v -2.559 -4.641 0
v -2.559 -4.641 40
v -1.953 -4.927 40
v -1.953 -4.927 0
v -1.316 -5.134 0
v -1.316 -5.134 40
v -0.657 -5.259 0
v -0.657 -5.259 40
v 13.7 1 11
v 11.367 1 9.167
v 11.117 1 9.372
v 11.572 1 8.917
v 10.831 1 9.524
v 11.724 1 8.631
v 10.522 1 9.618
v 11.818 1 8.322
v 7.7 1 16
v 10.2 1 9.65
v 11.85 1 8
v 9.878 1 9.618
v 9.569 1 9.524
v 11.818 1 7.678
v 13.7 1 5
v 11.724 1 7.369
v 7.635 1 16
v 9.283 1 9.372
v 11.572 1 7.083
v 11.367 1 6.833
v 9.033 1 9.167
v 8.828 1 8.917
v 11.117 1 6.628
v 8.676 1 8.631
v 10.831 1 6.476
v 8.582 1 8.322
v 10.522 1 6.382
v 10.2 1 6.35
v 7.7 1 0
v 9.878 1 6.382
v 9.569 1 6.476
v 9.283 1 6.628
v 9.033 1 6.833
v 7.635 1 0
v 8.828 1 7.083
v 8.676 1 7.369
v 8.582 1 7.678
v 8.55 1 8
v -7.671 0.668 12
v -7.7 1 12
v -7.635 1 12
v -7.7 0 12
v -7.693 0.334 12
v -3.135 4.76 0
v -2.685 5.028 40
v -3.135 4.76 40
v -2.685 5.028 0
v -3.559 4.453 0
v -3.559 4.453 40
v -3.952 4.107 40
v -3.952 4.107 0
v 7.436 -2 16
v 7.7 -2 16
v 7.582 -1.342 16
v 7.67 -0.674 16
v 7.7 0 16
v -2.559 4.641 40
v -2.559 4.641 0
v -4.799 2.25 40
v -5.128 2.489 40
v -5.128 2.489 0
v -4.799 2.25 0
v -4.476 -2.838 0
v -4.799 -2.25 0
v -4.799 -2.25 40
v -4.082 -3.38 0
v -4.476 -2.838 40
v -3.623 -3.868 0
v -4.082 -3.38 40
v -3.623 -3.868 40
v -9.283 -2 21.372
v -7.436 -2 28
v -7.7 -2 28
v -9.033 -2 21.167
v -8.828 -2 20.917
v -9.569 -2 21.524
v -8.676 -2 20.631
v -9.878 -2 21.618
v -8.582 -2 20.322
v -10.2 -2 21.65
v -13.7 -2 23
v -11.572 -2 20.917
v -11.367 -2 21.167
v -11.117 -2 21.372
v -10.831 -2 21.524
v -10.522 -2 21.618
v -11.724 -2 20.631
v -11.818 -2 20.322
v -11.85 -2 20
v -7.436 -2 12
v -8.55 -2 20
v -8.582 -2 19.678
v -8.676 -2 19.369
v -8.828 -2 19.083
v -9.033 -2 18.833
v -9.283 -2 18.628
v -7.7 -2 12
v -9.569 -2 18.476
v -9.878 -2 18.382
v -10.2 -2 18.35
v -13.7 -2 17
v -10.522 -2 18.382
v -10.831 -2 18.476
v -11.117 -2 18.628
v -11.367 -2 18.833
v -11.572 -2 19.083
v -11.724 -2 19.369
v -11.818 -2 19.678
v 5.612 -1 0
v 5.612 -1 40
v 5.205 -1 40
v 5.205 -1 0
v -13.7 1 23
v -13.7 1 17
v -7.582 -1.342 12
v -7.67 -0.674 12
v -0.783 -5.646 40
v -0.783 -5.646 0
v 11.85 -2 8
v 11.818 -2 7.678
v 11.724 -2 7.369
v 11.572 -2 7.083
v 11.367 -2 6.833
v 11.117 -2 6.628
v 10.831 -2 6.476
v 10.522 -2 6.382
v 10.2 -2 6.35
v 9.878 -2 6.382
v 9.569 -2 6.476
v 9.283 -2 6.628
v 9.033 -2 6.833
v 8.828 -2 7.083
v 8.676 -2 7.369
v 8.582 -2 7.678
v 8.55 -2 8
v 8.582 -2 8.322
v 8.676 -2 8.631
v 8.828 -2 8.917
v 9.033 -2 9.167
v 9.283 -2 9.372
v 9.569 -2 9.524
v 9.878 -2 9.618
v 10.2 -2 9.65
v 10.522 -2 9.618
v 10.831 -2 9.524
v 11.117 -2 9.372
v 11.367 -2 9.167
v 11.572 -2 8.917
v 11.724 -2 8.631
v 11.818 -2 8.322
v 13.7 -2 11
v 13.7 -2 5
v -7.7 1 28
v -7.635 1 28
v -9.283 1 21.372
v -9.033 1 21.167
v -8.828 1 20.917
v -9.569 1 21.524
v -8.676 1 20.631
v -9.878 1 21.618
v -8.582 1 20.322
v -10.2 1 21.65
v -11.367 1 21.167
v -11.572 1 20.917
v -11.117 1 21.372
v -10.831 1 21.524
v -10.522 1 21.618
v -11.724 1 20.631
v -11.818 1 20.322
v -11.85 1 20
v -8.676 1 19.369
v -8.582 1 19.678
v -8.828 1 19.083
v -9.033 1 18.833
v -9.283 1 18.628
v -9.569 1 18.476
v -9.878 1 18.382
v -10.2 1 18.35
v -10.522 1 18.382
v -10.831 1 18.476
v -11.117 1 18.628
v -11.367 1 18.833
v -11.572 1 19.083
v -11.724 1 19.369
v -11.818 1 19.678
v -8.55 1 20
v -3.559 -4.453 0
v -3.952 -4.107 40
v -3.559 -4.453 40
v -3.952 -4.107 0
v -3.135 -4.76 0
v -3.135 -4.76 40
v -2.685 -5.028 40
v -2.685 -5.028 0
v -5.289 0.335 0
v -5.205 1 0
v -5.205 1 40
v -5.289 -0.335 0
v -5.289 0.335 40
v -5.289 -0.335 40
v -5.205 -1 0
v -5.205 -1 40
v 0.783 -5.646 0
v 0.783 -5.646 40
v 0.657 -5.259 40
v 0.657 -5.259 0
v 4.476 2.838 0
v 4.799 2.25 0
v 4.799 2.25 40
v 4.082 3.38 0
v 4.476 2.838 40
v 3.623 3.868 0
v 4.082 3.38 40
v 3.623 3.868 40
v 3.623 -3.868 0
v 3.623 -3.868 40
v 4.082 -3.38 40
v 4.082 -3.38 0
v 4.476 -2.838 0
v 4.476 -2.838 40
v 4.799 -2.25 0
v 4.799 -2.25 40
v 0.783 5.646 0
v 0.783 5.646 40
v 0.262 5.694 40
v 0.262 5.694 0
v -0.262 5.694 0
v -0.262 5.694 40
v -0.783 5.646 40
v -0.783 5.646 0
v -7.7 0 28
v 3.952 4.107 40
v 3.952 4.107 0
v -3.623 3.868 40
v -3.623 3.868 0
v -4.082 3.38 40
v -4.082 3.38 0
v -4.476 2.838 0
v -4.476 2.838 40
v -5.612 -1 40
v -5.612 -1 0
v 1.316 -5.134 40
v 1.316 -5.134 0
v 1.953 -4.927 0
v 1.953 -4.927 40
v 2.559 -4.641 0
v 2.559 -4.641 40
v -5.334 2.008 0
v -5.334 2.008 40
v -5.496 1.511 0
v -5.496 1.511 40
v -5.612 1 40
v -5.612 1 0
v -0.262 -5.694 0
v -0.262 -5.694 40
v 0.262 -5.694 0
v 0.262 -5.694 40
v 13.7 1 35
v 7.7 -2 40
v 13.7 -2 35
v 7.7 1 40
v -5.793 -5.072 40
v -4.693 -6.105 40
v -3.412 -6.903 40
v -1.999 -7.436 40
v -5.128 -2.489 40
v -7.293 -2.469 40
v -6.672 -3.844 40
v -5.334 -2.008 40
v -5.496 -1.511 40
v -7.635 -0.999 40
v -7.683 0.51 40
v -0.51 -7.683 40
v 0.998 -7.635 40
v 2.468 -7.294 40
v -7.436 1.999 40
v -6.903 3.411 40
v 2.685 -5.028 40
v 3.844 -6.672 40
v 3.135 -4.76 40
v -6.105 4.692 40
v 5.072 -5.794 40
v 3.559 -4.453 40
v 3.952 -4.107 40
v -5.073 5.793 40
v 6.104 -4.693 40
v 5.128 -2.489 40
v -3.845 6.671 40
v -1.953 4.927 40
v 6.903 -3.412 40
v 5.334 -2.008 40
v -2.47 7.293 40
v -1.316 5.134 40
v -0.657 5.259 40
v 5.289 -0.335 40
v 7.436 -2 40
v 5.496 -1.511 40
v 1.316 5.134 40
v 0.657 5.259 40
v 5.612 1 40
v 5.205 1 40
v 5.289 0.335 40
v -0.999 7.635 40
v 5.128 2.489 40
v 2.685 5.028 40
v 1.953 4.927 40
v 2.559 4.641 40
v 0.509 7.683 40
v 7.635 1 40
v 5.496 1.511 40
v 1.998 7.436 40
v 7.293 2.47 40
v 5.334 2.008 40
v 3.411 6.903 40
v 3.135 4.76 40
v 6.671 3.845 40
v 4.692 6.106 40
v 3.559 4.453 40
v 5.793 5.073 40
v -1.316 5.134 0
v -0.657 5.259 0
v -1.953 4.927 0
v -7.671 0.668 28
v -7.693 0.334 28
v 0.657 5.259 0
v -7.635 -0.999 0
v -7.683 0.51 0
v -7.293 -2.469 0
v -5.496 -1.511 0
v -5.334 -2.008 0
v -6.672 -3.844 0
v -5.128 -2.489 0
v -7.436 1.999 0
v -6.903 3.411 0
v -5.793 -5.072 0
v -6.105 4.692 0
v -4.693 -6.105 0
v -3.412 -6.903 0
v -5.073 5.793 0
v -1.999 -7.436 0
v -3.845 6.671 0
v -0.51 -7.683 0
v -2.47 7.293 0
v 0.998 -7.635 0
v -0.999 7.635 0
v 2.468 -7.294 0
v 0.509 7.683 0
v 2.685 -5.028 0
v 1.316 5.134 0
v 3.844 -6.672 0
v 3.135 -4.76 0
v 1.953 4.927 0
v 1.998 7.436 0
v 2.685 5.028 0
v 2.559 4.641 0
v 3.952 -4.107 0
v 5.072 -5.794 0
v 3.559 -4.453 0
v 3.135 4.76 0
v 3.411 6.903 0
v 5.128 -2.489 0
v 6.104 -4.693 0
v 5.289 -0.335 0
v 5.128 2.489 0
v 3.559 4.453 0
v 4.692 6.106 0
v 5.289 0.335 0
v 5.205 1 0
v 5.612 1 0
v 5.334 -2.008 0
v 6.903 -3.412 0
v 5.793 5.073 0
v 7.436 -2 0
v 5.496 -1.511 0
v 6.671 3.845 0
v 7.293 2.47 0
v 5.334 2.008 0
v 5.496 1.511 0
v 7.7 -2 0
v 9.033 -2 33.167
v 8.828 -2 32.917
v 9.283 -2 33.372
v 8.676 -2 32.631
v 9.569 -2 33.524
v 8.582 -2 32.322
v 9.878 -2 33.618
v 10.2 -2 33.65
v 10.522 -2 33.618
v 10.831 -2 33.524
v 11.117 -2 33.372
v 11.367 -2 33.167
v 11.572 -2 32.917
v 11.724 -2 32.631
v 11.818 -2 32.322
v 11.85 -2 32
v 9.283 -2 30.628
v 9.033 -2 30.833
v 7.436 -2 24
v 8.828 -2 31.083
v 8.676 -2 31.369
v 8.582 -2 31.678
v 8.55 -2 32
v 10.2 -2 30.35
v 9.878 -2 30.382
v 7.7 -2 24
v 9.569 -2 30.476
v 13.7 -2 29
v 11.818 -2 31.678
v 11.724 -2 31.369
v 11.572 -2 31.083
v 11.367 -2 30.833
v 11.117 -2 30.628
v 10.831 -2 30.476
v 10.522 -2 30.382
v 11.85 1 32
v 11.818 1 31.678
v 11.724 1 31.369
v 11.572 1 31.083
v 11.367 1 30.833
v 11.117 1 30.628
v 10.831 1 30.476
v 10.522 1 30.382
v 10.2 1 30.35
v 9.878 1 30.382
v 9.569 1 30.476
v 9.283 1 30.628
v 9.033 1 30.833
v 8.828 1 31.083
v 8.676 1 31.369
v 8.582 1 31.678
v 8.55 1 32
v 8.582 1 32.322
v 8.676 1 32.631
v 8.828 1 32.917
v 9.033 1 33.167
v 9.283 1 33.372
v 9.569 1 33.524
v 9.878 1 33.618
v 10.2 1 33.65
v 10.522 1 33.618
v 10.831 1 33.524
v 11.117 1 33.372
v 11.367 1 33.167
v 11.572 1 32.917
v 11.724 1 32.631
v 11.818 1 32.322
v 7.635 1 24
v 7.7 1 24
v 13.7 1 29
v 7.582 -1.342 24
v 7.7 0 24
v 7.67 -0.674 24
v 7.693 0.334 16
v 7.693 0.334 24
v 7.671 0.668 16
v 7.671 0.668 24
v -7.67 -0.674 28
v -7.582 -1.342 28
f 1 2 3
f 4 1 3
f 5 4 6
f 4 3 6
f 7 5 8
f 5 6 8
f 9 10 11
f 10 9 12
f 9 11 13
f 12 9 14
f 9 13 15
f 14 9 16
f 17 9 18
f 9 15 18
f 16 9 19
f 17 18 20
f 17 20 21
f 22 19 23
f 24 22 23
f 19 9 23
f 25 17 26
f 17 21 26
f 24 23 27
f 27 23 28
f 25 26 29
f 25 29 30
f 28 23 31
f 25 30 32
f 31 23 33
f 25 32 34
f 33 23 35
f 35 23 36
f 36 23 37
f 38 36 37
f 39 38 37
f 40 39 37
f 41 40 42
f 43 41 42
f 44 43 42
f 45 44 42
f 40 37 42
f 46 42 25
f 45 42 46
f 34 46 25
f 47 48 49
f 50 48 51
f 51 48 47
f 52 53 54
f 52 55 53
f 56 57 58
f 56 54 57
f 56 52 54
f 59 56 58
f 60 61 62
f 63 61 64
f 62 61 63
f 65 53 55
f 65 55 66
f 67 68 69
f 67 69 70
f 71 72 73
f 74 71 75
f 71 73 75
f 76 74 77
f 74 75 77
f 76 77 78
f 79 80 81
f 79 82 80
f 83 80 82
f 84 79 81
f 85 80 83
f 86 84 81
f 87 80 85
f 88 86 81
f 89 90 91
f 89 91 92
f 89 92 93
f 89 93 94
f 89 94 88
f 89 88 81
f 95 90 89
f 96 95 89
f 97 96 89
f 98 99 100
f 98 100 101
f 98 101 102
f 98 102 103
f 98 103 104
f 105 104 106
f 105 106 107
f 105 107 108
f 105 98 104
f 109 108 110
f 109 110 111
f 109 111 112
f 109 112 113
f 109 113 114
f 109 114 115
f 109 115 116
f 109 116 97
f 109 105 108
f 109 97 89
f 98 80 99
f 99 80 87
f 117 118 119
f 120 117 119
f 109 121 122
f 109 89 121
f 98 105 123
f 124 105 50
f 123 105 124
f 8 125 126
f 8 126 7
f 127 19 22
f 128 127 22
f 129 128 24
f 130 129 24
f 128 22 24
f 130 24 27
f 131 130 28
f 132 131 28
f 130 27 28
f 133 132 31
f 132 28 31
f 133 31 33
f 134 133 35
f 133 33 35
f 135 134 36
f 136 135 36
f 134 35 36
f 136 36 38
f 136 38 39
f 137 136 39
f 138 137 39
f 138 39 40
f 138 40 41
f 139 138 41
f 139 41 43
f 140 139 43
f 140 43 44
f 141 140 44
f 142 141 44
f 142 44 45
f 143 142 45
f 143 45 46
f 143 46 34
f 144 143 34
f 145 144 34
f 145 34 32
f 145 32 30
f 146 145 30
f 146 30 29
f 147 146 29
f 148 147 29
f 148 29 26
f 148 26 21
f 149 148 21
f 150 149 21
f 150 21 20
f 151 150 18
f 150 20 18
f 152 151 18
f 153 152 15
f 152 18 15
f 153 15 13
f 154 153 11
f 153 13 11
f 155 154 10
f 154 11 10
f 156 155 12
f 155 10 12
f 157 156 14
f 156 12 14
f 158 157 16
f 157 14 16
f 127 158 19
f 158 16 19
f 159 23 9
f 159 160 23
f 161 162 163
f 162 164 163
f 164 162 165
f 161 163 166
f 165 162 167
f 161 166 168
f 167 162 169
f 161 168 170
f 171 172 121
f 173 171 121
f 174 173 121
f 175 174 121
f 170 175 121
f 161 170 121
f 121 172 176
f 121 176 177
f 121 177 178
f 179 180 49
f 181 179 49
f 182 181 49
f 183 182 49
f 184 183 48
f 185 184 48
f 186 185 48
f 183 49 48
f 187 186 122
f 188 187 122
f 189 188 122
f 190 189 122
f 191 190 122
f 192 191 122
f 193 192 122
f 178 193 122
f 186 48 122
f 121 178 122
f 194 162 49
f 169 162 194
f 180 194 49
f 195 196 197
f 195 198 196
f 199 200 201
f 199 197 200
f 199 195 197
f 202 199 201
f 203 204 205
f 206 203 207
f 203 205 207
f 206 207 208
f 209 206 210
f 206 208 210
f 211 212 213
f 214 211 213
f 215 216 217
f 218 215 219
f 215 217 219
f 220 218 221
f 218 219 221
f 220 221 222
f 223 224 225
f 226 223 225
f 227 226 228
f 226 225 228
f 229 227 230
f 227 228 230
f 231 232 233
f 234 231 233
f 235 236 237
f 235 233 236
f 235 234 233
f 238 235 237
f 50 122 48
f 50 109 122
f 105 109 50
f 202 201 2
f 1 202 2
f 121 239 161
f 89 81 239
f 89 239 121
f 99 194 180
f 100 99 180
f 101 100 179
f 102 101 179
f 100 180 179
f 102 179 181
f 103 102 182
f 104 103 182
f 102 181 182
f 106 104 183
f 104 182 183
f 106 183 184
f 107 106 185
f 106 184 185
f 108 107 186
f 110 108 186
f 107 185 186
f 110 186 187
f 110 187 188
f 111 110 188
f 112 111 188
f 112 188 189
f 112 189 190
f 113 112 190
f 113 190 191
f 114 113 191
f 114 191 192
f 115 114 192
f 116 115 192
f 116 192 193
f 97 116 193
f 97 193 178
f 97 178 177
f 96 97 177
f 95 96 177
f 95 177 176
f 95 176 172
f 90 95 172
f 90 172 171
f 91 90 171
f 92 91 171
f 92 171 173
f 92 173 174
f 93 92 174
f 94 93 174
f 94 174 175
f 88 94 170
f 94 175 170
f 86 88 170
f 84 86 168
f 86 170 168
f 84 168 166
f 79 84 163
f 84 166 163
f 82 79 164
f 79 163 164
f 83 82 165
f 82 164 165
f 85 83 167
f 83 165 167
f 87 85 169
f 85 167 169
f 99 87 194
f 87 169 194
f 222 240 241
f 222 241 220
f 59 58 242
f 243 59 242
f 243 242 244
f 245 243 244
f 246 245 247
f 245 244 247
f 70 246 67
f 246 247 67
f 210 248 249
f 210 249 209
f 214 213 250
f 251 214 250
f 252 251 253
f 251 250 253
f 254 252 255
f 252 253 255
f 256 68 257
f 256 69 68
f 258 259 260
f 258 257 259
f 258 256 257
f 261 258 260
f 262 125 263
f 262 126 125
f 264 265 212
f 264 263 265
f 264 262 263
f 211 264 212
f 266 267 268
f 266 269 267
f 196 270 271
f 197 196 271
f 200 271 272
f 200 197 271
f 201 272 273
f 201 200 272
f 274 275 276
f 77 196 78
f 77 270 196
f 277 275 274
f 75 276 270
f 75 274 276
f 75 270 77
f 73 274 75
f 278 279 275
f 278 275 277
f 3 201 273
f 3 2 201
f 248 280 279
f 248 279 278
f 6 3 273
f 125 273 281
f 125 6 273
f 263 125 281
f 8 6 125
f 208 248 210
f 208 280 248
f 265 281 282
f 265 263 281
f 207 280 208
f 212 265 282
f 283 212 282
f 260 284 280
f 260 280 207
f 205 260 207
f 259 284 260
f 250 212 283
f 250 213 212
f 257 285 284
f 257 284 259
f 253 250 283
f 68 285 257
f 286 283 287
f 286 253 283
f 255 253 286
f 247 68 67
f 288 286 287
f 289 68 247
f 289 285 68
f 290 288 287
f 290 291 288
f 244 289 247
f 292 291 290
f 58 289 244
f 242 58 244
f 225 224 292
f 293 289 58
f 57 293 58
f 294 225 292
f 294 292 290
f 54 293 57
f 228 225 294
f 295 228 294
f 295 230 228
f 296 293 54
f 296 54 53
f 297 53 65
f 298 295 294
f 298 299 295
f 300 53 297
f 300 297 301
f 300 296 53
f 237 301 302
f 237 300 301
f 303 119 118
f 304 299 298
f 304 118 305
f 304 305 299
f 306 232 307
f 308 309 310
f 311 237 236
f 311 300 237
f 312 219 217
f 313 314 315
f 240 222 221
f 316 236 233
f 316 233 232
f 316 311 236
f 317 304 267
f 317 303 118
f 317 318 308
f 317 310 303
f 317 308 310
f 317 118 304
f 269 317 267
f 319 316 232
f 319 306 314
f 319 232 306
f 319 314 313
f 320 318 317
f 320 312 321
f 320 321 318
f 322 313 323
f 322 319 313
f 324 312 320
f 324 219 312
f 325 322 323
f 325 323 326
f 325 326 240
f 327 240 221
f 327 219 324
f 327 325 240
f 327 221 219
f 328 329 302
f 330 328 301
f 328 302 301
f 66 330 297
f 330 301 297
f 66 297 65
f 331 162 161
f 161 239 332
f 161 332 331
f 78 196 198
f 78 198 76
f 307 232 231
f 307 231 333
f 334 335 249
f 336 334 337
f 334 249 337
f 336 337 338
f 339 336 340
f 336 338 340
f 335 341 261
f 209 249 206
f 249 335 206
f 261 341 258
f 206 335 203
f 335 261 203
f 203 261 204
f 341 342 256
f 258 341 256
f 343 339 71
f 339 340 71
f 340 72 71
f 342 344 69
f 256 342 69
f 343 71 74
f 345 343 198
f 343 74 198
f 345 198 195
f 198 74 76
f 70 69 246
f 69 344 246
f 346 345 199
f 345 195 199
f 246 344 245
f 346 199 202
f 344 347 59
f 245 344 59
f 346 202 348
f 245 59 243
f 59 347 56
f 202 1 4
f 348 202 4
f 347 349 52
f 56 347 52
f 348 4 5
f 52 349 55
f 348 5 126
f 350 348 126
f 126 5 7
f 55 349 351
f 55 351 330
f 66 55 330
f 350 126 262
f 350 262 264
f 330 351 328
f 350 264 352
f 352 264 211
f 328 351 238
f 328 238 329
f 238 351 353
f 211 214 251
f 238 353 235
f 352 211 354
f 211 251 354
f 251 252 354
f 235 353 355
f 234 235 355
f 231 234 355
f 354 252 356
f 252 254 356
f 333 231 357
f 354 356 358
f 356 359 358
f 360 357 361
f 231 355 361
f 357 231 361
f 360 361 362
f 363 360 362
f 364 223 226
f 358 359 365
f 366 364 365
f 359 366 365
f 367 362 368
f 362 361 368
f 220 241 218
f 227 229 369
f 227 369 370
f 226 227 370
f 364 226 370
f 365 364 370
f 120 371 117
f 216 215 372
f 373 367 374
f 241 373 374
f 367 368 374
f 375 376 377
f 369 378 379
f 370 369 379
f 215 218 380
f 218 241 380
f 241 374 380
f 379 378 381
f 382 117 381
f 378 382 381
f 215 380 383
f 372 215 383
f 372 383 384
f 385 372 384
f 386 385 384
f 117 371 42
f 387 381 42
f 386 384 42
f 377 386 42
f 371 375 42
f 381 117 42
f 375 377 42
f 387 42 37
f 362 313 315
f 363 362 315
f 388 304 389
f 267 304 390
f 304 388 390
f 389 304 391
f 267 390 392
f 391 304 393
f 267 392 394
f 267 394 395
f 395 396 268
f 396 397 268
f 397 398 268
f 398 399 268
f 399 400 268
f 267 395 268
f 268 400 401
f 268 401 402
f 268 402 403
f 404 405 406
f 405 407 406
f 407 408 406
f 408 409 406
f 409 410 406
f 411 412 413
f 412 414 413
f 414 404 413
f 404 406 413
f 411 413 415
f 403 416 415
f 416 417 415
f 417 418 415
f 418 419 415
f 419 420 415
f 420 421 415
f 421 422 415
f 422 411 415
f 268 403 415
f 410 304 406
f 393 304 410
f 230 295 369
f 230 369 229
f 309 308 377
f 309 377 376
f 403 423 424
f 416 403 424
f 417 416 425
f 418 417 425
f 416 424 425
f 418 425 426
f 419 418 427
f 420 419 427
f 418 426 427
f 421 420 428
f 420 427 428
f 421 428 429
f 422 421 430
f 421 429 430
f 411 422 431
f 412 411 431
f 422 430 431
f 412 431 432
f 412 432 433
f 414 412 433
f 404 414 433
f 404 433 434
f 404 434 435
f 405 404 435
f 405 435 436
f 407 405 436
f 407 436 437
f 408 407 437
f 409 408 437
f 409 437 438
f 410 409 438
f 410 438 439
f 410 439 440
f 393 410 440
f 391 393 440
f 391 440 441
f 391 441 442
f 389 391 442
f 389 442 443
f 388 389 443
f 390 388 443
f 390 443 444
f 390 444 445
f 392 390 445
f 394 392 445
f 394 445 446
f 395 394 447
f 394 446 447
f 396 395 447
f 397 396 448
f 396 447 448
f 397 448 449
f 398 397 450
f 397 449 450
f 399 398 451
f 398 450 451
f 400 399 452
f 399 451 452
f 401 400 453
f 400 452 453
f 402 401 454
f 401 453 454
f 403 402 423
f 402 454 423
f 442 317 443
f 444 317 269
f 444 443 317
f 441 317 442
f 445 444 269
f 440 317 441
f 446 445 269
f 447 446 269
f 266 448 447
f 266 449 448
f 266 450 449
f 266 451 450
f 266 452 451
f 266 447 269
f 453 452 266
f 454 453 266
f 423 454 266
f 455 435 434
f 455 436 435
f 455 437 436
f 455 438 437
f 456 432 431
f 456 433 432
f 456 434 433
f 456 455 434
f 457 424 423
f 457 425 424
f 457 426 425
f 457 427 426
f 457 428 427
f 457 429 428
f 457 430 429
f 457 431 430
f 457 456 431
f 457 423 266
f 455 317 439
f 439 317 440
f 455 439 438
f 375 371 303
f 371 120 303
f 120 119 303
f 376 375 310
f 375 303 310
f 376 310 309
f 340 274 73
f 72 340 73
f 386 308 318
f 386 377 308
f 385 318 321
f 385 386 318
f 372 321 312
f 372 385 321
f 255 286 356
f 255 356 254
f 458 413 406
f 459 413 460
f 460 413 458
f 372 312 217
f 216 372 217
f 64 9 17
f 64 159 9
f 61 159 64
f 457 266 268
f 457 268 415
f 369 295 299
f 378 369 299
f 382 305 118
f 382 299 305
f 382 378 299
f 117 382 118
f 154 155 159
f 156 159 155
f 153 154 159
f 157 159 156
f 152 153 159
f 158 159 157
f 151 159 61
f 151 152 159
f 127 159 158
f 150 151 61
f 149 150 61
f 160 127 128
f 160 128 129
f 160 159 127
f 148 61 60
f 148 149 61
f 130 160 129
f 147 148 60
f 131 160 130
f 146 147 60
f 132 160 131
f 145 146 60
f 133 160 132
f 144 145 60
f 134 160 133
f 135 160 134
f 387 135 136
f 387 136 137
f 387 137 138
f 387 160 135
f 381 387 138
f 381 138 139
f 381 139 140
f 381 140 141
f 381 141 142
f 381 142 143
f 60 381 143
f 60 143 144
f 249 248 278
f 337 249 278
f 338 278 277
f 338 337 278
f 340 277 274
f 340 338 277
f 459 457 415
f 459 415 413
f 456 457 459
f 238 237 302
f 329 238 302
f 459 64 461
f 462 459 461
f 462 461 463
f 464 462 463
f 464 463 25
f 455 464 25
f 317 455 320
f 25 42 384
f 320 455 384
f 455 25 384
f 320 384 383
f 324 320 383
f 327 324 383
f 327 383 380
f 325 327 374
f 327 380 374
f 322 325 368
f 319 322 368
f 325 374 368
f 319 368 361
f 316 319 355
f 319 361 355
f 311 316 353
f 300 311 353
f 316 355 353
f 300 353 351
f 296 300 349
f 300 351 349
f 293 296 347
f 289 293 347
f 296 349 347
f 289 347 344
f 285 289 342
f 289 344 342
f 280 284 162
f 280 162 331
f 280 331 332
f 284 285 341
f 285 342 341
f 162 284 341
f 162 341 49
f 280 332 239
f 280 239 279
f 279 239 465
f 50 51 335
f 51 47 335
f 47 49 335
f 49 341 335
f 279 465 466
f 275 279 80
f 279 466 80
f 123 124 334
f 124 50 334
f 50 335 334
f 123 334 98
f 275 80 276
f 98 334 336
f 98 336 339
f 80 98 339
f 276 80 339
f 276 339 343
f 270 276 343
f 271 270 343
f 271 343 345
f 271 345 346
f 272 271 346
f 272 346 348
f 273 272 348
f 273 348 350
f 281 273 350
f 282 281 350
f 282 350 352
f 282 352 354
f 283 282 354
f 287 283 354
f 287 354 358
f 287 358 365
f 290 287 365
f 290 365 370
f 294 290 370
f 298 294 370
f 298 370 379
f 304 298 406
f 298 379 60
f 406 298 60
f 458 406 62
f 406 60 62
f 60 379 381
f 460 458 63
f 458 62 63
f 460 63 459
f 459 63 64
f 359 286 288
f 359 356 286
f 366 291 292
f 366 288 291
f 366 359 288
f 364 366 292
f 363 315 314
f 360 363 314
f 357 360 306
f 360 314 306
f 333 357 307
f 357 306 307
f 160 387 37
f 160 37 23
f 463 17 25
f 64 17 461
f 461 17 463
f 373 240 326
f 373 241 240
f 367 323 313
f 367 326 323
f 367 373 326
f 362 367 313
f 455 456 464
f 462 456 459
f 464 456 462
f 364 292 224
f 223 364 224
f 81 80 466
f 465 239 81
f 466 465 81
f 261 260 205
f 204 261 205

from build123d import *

# Parameters (mm, degrees)
ESBO_O1_R                     = 7.7
ESBO_O1_R_2                   = 5.7
RESSALTO_EXTRUS_O1_DEPTH      = 40
RESSALTO_EXTRUS_O3_DEPTH      = 1
RESSALTO_EXTRUS_O3_DEPTH_BACK = 2
ESBO_O4_R                     = 1.65
CORTE_EXTRUS_O1_DEPTH         = 9.7
ESBO_O5_W                     = 3.890243015
ESBO_O5_H                     = 2
RESSALTO_EXTRUS_O4_DEPTH      = 40
PADR_OCIRCULAR1_COUNT         = 10
ESBO_O6_R                     = 5.3
CORTE_EXTRUS_O2_DEPTH         = 41


with BuildPart() as part:
    # Esboço1 → Ressalto-extrusão1 (new body)
    with BuildSketch(Plane.XY):
        Circle(ESBO_O1_R)
        Circle(ESBO_O1_R_2, mode=Mode.SUBTRACT)
    extrude(amount=RESSALTO_EXTRUS_O1_DEPTH)

    # Esboço3 → Ressalto-extrusão3 (add, two sides)
    with BuildSketch(Plane(origin=(0, 0, 0), x_dir=(1, 0, 0), z_dir=(0, 1, 0))) as ressalto_extrus_o3_sk:
        Polygon((7.7, -40), (13.7, -35), (13.7, -29), (7.7, -24), (6.7, -24), (6.7, -40), align=None)
        Polygon((7.7, 0), (13.7, -5), (13.7, -11), (7.7, -16), (6.7, -16), (6.7, 0), align=None)
        Polygon((-7.7, -28), (-13.7, -23), (-13.7, -17), (-7.7, -12), (-6.7, -12), (-6.7, -28), align=None)
    extrude(amount=RESSALTO_EXTRUS_O3_DEPTH)
    extrude(ressalto_extrus_o3_sk.sketch, amount=-RESSALTO_EXTRUS_O3_DEPTH_BACK)

    # Esboço4 → Corte-extrusão1 (cut, through all)
    with BuildSketch(Plane(origin=(0, 1, 0), x_dir=(1, 0, 0), z_dir=(0, 1, 0))):
        with Locations((10.2, -32)):
            Circle(ESBO_O4_R)
        with Locations((10.2, -8)):
            Circle(ESBO_O4_R)
        with Locations((-10.2, -20)):
            Circle(ESBO_O4_R)
    extrude(amount=-CORTE_EXTRUS_O1_DEPTH, mode=Mode.SUBTRACT)

    # Esboço5 → Ressalto-extrusão4 (add)
    with BuildSketch(Plane.XY.offset(40)):
        with Locations((-4.945121507, 0)):
            Rectangle(ESBO_O5_W, ESBO_O5_H)
    ressalto_extrus_o4 = extrude(amount=-RESSALTO_EXTRUS_O4_DEPTH)

    # PadrãoCircular1: Ressalto-extrusão4 ×10 about axis
    padr_ocircular1_axis = Axis((0, 0, 0), (0, 0, 1))
    for i in range(1, PADR_OCIRCULAR1_COUNT):
        add(ressalto_extrus_o4.rotate(padr_ocircular1_axis, i * 360 / PADR_OCIRCULAR1_COUNT))

    # Esboço6 → Corte-extrusão2 (cut, through all)
    with BuildSketch(Plane.XY.offset(40)):
        Circle(ESBO_O6_R)
    extrude(amount=-CORTE_EXTRUS_O2_DEPTH, mode=Mode.SUBTRACT)


solid = part.part
